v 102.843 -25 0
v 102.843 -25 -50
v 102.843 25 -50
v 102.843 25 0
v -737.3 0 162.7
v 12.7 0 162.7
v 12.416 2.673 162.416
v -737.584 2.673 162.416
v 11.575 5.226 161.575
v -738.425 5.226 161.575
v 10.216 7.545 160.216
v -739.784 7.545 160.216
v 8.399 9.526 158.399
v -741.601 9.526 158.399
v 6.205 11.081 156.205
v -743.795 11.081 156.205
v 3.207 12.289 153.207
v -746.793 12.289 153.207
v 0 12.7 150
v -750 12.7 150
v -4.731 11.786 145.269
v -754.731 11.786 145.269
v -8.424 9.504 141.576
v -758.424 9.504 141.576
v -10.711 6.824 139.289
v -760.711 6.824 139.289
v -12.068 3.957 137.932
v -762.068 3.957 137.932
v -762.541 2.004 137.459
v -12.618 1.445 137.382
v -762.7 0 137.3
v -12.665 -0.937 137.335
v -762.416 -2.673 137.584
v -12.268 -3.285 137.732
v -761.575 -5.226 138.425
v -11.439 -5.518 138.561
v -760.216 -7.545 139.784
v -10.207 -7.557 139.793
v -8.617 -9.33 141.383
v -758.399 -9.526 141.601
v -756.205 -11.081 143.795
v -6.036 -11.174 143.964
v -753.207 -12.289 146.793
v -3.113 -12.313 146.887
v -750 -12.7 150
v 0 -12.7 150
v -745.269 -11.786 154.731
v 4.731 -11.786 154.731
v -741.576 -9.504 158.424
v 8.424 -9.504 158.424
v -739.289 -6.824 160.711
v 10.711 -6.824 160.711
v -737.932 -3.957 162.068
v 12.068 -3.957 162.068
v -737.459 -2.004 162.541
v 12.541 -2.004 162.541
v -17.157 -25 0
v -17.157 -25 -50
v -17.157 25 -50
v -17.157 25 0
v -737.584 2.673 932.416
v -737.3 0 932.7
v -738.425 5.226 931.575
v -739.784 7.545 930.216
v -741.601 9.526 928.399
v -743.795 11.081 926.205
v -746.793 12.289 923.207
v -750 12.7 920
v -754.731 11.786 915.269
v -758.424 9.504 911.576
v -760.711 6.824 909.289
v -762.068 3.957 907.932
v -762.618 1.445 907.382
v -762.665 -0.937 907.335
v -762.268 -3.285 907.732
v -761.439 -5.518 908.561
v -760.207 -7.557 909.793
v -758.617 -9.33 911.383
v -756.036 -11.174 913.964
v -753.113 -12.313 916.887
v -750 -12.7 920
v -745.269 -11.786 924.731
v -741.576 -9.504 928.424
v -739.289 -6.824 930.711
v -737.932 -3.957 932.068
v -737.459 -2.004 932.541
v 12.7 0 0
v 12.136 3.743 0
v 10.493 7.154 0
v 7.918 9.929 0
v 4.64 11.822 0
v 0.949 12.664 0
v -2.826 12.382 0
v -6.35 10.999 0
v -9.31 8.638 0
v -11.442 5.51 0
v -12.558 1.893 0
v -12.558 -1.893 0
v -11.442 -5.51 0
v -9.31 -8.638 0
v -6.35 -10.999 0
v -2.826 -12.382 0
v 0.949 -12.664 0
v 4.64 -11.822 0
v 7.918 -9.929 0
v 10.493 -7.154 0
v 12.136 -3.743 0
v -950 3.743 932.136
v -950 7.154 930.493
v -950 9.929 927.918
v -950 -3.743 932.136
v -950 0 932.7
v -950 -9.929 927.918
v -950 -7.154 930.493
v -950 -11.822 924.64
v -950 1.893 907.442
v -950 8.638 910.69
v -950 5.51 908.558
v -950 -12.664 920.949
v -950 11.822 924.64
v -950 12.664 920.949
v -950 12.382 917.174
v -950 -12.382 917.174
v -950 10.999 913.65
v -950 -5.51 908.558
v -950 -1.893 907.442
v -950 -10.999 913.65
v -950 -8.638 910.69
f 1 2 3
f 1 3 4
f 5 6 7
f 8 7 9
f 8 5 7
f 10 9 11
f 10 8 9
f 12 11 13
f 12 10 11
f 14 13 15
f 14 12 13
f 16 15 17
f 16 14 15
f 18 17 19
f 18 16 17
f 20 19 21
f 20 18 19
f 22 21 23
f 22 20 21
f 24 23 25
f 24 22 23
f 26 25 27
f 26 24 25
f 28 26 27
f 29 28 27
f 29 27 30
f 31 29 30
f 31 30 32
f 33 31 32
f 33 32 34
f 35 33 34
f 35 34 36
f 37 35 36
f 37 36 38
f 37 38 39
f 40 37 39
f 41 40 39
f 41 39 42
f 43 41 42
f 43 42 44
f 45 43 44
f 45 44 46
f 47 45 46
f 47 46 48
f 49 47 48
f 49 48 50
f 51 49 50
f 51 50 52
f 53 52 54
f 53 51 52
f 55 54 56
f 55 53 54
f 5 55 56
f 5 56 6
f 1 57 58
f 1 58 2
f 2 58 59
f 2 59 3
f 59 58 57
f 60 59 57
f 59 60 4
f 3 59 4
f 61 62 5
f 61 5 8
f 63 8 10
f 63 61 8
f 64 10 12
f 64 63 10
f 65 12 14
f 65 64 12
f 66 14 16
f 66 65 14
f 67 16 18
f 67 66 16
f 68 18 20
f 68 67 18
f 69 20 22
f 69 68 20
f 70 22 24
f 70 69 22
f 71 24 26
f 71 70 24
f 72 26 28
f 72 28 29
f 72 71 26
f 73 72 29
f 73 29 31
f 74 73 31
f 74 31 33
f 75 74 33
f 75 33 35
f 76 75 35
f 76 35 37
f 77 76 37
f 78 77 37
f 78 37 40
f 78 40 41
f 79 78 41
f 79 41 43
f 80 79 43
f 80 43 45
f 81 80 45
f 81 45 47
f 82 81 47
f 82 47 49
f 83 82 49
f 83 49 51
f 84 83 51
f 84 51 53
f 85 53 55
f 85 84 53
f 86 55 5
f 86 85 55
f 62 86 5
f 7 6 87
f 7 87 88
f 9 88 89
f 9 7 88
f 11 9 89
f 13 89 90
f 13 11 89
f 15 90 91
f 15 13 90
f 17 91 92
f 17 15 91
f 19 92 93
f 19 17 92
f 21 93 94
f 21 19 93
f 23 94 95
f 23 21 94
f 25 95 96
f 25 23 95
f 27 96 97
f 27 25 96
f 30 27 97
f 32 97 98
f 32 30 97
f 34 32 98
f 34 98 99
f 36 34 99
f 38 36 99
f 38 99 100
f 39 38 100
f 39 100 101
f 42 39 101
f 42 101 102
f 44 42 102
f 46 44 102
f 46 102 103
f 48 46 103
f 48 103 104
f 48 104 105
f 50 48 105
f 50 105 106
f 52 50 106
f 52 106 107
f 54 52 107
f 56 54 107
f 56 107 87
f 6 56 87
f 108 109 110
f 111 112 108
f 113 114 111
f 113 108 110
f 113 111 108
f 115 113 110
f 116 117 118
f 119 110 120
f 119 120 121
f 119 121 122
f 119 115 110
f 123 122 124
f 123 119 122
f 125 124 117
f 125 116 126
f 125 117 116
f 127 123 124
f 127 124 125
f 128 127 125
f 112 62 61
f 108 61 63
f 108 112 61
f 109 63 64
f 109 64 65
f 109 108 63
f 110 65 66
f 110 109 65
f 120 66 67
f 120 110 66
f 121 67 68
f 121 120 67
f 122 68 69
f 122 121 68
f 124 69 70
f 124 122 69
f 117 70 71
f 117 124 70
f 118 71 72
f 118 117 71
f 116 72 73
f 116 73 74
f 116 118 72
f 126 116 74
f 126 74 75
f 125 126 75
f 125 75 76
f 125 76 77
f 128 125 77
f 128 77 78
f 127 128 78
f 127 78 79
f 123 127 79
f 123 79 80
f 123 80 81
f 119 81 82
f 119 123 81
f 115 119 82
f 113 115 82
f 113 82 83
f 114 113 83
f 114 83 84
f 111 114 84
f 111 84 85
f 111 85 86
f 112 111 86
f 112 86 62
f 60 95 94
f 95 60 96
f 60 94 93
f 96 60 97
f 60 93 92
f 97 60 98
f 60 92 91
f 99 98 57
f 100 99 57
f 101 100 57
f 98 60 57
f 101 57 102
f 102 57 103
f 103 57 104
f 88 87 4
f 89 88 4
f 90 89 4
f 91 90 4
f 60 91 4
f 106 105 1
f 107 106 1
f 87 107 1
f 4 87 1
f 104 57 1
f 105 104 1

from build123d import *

# Parameters (mm, degrees)
F0_W          = 120
F0_H          = 50
F1_DEPTH      = 25
F1_DEPTH_BACK = 25
F3_R          = 12.7


with BuildPart() as f1:
    # F0 (on Front) → F1 (new body, two sides)
    with BuildSketch(Plane.XZ) as f1_sk:
        with Locations((42.842679834, -25)):
            Rectangle(F0_W, F0_H)
    extrude(amount=F1_DEPTH)
    extrude(f1_sk.sketch, amount=-F1_DEPTH_BACK)

    # F4: sweep along a path in F2
    with BuildLine(Plane.XZ) as f4_path:
        Line((0, 0), (0, 150))
        Line((0, 150), (-750, 150))
        Line((-750, 150), (-750, 920))
        Line((-750, 920), (-950, 920))
    # F3 (on Top) → F4 (sweep)
    with BuildSketch(Plane.XY):
        Circle(F3_R)
    sweep(path=f4_path.line, transition=Transition.RIGHT)


solid = f1.part
